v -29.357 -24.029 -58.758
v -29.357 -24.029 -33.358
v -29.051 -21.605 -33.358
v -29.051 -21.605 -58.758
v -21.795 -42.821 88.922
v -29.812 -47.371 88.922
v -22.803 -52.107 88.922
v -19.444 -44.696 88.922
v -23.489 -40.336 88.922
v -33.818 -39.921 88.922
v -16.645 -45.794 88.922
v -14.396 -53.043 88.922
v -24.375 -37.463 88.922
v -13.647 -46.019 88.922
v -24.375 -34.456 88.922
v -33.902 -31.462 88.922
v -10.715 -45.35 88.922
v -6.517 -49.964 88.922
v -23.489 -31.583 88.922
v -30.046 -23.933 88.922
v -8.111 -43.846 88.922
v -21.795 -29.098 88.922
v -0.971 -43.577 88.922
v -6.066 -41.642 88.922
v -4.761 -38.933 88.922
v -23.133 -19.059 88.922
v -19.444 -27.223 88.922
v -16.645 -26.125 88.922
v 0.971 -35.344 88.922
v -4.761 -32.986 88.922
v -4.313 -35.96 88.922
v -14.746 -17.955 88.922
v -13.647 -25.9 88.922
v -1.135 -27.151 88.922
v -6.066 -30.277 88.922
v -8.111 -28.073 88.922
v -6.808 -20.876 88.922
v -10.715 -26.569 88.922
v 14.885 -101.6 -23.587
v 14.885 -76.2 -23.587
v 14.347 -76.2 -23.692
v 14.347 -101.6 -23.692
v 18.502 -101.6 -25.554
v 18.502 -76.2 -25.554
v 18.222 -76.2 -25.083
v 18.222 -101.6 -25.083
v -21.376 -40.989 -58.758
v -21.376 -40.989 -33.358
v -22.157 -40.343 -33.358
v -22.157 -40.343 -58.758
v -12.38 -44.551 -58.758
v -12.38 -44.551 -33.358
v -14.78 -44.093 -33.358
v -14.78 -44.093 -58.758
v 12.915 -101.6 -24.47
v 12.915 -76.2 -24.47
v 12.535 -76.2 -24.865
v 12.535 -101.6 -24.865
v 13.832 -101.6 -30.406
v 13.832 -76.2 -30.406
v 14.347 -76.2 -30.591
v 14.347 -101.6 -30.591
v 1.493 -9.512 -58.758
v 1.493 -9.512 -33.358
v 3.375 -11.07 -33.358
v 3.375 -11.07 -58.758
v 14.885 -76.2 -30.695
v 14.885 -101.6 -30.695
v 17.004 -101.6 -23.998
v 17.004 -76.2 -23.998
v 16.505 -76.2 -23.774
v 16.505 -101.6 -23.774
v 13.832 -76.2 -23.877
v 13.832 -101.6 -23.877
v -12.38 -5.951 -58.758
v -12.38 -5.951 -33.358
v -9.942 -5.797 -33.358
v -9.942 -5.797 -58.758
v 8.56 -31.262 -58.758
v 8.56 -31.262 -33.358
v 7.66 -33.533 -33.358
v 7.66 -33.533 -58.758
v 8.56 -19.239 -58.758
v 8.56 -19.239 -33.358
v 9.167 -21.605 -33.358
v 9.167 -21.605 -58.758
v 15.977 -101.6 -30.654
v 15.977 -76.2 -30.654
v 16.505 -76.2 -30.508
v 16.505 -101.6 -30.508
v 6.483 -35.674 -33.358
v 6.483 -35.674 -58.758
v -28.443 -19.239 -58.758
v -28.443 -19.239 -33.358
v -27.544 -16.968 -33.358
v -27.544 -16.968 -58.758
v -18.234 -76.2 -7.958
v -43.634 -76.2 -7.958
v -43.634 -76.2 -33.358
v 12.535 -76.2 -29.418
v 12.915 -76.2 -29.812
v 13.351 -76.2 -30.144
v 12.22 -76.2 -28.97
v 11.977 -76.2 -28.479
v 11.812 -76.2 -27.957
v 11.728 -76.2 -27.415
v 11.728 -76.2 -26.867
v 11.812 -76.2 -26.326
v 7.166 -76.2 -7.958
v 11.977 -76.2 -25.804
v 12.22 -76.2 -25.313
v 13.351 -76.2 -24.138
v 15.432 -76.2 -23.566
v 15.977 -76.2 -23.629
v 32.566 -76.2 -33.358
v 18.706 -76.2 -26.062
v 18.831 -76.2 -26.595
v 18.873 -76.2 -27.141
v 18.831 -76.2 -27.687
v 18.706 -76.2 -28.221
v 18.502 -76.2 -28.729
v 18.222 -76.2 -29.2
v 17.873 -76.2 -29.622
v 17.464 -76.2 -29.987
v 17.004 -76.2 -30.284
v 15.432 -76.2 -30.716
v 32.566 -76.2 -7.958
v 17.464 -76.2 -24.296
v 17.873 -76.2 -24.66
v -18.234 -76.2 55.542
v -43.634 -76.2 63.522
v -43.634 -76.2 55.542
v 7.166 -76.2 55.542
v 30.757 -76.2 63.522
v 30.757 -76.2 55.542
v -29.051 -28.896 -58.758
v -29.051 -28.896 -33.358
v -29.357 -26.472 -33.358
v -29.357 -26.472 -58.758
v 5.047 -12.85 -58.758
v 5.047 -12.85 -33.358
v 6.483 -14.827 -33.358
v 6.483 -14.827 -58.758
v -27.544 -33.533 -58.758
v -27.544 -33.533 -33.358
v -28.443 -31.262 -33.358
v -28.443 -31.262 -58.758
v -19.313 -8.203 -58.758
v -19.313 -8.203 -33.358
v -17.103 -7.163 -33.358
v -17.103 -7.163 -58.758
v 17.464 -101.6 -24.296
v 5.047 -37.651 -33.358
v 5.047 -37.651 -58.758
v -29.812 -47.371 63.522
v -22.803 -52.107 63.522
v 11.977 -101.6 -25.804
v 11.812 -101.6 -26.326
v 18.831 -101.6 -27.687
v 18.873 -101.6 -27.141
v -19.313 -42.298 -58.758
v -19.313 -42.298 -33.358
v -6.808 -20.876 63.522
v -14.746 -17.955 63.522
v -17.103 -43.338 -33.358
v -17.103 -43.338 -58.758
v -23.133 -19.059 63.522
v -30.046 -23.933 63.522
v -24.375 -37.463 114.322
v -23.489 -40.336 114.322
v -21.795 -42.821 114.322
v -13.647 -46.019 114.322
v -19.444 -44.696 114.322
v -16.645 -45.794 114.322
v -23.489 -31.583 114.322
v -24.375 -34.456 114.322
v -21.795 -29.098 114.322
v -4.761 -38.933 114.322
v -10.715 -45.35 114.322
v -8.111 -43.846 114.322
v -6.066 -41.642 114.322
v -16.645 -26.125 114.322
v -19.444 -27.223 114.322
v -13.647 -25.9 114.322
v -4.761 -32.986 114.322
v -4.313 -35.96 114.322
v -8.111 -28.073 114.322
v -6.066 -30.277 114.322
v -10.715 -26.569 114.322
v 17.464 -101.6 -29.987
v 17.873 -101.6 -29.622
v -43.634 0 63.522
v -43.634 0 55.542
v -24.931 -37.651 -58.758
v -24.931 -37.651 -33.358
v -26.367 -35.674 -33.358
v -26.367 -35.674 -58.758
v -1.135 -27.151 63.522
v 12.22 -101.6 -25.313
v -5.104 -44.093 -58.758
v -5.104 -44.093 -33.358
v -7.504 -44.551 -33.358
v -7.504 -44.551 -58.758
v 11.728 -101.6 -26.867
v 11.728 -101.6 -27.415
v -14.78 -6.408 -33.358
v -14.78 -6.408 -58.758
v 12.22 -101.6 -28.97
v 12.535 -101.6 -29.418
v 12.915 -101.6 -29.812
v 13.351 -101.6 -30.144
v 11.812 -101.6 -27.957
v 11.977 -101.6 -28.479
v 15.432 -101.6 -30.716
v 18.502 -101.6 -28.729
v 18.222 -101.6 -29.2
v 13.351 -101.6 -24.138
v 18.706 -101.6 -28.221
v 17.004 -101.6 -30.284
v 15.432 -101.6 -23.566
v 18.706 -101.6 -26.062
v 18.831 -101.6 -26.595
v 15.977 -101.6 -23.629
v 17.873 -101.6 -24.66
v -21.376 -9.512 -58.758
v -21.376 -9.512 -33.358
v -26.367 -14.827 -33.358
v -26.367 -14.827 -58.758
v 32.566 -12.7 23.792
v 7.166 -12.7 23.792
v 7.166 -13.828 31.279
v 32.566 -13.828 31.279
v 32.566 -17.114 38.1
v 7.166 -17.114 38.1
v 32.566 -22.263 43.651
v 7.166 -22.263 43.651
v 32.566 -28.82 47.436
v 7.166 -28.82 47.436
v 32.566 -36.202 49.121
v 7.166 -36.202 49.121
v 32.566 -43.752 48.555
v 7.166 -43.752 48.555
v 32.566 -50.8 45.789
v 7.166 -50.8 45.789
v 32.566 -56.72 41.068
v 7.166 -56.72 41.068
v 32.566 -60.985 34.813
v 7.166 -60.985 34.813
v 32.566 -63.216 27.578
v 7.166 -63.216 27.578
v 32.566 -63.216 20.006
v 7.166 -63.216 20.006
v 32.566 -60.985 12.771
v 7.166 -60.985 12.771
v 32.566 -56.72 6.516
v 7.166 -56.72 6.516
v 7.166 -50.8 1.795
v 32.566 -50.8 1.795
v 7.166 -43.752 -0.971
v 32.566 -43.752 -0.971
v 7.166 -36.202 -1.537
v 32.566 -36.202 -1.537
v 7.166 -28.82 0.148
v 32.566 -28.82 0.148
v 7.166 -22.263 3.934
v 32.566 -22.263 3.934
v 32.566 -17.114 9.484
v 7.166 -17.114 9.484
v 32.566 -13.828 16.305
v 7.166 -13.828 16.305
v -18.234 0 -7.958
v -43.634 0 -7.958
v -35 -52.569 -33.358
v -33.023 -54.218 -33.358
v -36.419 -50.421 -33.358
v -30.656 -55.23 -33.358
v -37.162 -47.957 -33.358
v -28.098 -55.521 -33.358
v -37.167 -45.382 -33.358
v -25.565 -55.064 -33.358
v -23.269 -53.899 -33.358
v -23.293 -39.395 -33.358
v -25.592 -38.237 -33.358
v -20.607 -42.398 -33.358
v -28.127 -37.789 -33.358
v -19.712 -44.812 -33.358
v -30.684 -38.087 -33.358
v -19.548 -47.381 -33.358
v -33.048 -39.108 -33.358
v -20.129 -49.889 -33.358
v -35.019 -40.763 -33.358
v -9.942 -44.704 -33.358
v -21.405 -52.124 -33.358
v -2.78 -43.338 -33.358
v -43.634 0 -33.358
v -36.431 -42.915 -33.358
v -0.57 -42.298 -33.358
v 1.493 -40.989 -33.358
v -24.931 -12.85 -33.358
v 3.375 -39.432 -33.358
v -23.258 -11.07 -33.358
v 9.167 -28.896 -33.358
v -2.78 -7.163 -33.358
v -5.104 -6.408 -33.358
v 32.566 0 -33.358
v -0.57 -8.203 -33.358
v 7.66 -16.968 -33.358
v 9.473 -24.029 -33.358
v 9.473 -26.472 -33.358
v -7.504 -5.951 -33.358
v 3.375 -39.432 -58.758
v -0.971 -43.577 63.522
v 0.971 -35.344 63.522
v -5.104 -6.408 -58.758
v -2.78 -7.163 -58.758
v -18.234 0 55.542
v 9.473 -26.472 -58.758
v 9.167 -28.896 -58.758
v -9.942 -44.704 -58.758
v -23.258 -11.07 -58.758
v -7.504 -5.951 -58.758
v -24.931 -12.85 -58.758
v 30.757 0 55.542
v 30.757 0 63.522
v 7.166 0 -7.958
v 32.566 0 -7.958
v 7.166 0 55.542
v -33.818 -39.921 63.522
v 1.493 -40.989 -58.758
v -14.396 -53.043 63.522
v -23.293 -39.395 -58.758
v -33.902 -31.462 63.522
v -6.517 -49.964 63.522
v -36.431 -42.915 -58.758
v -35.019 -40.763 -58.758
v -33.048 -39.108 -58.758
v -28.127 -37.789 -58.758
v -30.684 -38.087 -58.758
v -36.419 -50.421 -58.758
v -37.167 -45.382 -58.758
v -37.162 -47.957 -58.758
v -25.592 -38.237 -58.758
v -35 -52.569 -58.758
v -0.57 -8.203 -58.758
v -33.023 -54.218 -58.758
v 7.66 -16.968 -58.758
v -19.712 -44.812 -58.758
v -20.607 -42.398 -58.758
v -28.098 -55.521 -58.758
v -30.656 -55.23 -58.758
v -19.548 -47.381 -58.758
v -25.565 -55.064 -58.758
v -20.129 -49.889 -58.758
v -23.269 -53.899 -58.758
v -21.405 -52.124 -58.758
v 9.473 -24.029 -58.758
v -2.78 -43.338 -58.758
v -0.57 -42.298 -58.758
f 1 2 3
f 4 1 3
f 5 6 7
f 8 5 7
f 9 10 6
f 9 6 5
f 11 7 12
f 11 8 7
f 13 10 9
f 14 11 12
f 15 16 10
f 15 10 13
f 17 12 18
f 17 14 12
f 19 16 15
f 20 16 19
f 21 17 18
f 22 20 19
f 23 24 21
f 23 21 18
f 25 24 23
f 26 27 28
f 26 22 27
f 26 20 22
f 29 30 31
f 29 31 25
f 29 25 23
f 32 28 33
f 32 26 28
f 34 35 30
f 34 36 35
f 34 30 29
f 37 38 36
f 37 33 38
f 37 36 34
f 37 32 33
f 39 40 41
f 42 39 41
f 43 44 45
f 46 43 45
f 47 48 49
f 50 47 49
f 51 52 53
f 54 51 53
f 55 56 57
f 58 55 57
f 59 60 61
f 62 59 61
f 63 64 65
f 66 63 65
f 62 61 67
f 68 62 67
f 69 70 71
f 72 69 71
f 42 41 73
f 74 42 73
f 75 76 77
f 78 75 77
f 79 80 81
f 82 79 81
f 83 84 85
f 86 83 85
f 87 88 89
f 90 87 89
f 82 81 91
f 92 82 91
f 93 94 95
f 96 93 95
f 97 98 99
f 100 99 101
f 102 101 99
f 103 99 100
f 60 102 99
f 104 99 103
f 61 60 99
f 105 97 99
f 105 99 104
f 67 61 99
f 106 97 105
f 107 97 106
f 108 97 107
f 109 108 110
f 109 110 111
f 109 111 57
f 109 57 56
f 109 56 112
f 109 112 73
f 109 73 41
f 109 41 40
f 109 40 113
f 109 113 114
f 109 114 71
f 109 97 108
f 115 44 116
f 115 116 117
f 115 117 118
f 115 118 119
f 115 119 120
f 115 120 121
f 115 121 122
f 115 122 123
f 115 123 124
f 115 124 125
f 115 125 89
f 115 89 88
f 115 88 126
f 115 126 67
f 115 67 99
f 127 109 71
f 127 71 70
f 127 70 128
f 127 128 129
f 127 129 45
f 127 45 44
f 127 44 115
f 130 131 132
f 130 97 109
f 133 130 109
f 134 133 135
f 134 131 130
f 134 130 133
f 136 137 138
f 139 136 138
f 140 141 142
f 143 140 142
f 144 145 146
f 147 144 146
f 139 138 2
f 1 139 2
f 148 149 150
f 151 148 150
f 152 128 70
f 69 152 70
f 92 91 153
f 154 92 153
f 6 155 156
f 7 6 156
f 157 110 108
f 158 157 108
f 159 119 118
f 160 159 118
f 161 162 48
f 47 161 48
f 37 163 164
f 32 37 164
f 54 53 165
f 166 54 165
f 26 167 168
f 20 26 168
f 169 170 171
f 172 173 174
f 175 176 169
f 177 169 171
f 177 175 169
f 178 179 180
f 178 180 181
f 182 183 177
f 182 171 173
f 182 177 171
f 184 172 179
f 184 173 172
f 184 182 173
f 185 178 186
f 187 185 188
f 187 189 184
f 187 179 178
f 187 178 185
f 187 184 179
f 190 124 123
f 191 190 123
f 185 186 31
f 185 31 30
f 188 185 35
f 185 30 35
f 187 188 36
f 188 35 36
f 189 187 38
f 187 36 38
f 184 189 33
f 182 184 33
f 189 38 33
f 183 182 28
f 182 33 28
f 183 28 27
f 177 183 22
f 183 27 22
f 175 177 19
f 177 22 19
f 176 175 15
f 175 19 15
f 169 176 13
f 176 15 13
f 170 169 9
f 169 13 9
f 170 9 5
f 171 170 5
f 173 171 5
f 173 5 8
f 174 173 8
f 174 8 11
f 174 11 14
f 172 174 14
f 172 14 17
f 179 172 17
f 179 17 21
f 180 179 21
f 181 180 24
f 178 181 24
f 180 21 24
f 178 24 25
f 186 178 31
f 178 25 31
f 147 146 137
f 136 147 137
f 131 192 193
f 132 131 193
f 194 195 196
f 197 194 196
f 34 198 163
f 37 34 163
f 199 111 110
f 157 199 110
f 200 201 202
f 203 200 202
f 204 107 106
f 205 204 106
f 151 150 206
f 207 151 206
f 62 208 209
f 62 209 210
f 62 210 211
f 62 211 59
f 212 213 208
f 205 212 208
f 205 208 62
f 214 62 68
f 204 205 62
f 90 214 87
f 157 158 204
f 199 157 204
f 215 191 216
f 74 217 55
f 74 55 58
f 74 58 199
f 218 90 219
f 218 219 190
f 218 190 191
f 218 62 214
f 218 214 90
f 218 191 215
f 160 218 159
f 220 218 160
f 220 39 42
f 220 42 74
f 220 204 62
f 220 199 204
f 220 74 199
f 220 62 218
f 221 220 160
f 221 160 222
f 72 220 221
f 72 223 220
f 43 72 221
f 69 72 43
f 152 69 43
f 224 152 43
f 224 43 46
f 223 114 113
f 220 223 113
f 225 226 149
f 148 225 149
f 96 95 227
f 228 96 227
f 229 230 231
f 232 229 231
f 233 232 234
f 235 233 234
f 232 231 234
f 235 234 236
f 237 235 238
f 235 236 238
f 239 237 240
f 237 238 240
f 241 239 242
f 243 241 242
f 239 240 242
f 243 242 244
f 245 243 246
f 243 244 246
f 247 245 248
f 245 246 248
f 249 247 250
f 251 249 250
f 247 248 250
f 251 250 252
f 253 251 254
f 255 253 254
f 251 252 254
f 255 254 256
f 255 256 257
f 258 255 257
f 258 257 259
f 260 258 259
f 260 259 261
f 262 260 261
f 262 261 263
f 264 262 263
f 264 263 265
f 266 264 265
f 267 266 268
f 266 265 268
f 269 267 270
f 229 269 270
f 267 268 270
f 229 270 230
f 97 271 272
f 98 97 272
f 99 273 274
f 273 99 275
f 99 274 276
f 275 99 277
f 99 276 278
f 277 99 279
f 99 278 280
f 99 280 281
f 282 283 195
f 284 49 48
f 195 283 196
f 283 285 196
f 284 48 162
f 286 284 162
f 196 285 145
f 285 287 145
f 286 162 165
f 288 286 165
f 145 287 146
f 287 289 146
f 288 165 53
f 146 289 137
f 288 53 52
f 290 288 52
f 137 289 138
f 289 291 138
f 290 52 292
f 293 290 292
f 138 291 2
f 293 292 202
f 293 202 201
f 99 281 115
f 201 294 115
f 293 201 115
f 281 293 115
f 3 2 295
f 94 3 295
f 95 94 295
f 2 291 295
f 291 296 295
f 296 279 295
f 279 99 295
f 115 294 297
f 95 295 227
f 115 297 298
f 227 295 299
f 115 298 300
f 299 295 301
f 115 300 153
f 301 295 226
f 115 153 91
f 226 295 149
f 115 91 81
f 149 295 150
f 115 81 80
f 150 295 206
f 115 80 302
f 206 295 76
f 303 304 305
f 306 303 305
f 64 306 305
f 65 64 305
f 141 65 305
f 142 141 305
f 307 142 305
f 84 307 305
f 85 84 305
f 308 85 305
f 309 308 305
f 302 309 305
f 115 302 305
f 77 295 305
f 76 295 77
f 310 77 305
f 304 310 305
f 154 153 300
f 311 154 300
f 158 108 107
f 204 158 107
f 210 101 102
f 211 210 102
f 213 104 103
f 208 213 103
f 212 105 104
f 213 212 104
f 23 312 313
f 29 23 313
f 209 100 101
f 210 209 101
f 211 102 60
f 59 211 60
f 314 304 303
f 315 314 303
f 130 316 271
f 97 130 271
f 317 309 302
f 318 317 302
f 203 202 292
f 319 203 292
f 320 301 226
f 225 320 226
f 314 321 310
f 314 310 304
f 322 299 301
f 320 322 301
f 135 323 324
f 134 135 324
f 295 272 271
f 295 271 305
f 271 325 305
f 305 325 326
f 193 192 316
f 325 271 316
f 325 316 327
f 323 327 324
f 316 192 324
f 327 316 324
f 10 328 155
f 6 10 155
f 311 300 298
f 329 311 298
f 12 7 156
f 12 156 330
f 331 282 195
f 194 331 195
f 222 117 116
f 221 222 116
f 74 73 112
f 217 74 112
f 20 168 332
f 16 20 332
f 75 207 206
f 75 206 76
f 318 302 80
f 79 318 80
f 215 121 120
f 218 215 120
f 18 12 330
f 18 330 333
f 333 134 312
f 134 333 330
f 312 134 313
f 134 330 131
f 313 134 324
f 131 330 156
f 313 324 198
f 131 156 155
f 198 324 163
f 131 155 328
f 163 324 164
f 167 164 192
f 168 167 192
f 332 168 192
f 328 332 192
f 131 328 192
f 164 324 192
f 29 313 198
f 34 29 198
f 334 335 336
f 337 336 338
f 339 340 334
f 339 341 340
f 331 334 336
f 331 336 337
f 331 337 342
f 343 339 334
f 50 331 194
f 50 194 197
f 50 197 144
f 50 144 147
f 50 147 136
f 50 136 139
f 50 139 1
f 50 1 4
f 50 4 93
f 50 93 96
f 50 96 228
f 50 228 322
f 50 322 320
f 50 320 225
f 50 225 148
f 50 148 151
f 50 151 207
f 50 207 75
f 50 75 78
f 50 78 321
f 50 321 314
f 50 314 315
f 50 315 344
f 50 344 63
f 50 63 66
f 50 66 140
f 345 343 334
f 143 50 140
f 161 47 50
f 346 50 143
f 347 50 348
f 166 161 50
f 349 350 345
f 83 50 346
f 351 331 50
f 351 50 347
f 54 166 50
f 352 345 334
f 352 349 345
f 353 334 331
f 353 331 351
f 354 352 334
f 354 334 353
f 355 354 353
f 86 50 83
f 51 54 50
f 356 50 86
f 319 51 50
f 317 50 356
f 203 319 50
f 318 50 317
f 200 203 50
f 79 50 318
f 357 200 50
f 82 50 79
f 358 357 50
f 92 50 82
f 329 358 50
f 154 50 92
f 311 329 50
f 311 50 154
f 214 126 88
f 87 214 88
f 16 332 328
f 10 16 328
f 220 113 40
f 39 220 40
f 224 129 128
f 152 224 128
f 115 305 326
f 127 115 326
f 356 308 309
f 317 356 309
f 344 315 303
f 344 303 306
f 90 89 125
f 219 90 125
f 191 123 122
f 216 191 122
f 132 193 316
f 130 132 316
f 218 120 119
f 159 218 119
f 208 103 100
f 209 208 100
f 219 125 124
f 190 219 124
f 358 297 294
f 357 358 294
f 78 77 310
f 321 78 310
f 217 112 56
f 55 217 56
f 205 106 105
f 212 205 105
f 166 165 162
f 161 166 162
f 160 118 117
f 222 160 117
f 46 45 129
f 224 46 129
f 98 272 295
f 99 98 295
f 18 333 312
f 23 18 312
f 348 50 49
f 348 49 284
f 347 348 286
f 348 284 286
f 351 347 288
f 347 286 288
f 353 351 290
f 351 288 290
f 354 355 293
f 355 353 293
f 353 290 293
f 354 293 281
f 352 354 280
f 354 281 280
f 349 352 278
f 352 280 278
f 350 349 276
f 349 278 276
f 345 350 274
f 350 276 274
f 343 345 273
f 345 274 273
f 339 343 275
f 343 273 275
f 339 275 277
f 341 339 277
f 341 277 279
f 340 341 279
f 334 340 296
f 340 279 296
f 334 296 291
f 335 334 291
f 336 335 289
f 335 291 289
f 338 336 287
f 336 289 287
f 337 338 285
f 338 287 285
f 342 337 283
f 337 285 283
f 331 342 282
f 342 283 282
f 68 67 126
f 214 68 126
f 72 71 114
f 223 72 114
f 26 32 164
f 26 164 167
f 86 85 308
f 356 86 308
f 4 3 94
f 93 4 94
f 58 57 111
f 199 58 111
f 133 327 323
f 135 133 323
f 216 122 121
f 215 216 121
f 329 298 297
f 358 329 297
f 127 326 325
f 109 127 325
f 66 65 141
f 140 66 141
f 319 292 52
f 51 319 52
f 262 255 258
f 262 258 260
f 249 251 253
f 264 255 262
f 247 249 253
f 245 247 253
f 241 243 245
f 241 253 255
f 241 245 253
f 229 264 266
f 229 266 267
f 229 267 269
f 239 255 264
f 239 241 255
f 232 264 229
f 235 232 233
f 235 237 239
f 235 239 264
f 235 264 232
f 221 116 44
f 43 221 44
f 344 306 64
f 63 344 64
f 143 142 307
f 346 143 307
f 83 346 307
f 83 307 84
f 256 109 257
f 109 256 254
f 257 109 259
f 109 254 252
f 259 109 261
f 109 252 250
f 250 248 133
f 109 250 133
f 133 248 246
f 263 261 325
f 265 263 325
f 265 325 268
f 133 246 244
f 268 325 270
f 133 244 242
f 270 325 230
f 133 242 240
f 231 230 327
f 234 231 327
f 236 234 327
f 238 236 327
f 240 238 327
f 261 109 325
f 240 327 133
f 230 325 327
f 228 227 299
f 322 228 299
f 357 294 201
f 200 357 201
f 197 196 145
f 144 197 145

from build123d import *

# Parameters (mm, degrees)
F1_DEPTH  = 76.2
F2_R      = 25.4
F3_DEPTH  = 25.4
F5_DEPTH  = 25.4
F6_R      = 10.087603
F7_DEPTH  = 25.4
F9_DEPTH  = 25.4
F10_R     = 8.870052
F11_DEPTH = 25.4
F13_DEPTH = 25.4


with BuildPart() as f1:
    # F0 (on Front) → F1 (new body)
    with BuildSketch(Plane.XZ):
        Polygon((-43.63443, -7.957917), (-43.63443, -33.357917), (32.56557, -33.357917), (32.56557, -7.957917), (7.16557, -7.957917), (7.16557, 55.542083), (30.757195, 55.542083), (30.757195, 63.522073), (-43.63443, 63.522073), (-43.63443, 55.542083), (-18.23443, 55.542083), (-18.23443, -7.957917), align=None)
    extrude(amount=F1_DEPTH)

    # F2 (on face) → F3 (join)
    with BuildSketch(Plane.YZ.offset(7.16557)):
        with Locations((-38.1, 23.792083)):
            Circle(F2_R)
    extrude(amount=F3_DEPTH)

    # F4 (on face) → F5 (join)
    with BuildSketch(Plane.XY.offset(63.522073)):
        Polygon((-0.971111, -43.576736), (0.971111, -35.34374), (-1.135201, -27.151187), (-6.807516, -20.875895), (-14.746376, -17.955455), (-23.133083, -19.058907), (-30.046344, -23.933462), (-33.902414, -31.462418), (-33.817914, -39.920983), (-29.812201, -47.371402), (-22.802937, -52.106872), (-14.395859, -53.042555), (-6.516928, -49.964097), align=None)
    extrude(amount=F5_DEPTH)

    # F6 (on face) → F7 (join)
    with BuildSketch(Plane.XY.offset(88.922073)):
        with Locations((-14.400505, -35.959587)):
            Circle(F6_R)
    extrude(amount=F7_DEPTH)

    # F8 (on face) → F9 (join)
    with BuildSketch(Plane.XZ.offset(76.2)):
        Polygon((11.728236, -26.867476), (11.728236, -27.415208), (11.811846, -27.95652), (11.977108, -28.478726), (12.220148, -28.969584), (12.535268, -29.41759), (12.915083, -29.812243), (13.35069, -30.144292), (13.831879, -30.405954), (14.347372, -30.591096), (14.885084, -30.69538), (15.432414, -30.716359), (15.976532, -30.653544), (16.504684, -30.508405), (17.004492, -30.284345), (17.464239, -29.986616), (17.87315, -29.622196), (18.22164, -29.199627), (18.501541, -28.728813), (18.706292, -28.22079), (18.831095, -27.687467), (18.873023, -27.141342), (18.831095, -26.595217), (18.706292, -26.061893), (18.501541, -25.553871), (18.22164, -25.083057), (17.87315, -24.660488), (17.464239, -24.296068), (17.004492, -23.998339), (16.504684, -23.774279), (15.976532, -23.62914), (15.432414, -23.566325), (14.885084, -23.587304), (14.347372, -23.691587), (13.831879, -23.87673), (13.35069, -24.138392), (12.915083, -24.470441), (12.535268, -24.865094), (12.220148, -25.3131), (11.977108, -25.803958), (11.811846, -26.326163), align=None)
    extrude(amount=F9_DEPTH)

    # F10 (on face) → F11 (join)
    with BuildSketch(Plane(origin=(0, 0, -33.357917), x_dir=(1, 0, 0), z_dir=(0, 0, -1))):
        with Locations((-28.388368, 46.655256)):
            Circle(F10_R)
    extrude(amount=F11_DEPTH)

    # F12 (on face) → F13 (join)
    with BuildSketch(Plane(origin=(0, 0, -33.357917), x_dir=(1, 0, 0), z_dir=(0, 0, -1))):
        with BuildLine():
            Line((9.473382, 24.02906), (9.473382, 26.472044))
            Line((9.473382, 26.472044), (9.167195, 28.895765))
            Line((9.167195, 28.895765), (8.55965, 31.261998))
            Line((8.55965, 31.261998), (7.660328, 33.533427))
            Line((7.660328, 33.533427), (6.483411, 35.67423))
            Line((6.483411, 35.67423), (5.047461, 37.650645))
            Line((5.047461, 37.650645), (3.375124, 39.431504))
            Line((3.375124, 39.431504), (1.492772, 40.988721))
            Line((1.492772, 40.988721), (-0.569908, 42.297737))
            Line((-0.569908, 42.297737), (-2.780386, 43.337909))
            Line((-2.780386, 43.337909), (-5.103801, 44.092833))
            Line((-5.103801, 44.092833), (-7.503513, 44.550602))
            Line((-7.503513, 44.550602), (-9.941677, 44.703998))
            Line((-9.941677, 44.703998), (-12.37984, 44.550602))
            Line((-12.37984, 44.550602), (-14.779552, 44.092833))
            Line((-14.779552, 44.092833), (-17.102968, 43.337909))
            Line((-17.102968, 43.337909), (-19.313446, 42.297737))
            Line((-19.313446, 42.297737), (-21.376125, 40.988721))
            Line((-21.376125, 40.988721), (-22.157084, 40.342656))
            ThreePointArc((-22.157084, 40.342656), (-22.705241, 39.844977), (-23.292994, 39.394747))
            Line((-23.292994, 39.394747), (-24.930814, 37.650645))
            Line((-24.930814, 37.650645), (-26.366764, 35.67423))
            Line((-26.366764, 35.67423), (-27.543681, 33.533427))
            Line((-27.543681, 33.533427), (-28.443003, 31.261998))
            Line((-28.443003, 31.261998), (-29.050549, 28.895765))
            Line((-29.050549, 28.895765), (-29.356736, 26.472044))
            Line((-29.356736, 26.472044), (-29.356736, 24.02906))
            Line((-29.356736, 24.02906), (-29.050549, 21.60534))
            Line((-29.050549, 21.60534), (-28.443003, 19.239107))
            Line((-28.443003, 19.239107), (-27.543681, 16.967678))
            Line((-27.543681, 16.967678), (-26.366764, 14.826875))
            Line((-26.366764, 14.826875), (-24.930814, 12.850459))
            Line((-24.930814, 12.850459), (-23.258477, 11.0696))
            Line((-23.258477, 11.0696), (-21.376125, 9.512384))
            Line((-21.376125, 9.512384), (-19.313446, 8.203367))
            Line((-19.313446, 8.203367), (-17.102968, 7.163196))
            Line((-17.102968, 7.163196), (-14.779552, 6.408272))
            Line((-14.779552, 6.408272), (-12.37984, 5.950502))
            Line((-12.37984, 5.950502), (-9.941677, 5.797106))
            Line((-9.941677, 5.797106), (-7.503513, 5.950502))
            Line((-7.503513, 5.950502), (-5.103801, 6.408272))
            Line((-5.103801, 6.408272), (-2.780386, 7.163196))
            Line((-2.780386, 7.163196), (-0.569908, 8.203367))
            Line((-0.569908, 8.203367), (1.492772, 9.512384))
            Line((1.492772, 9.512384), (3.375124, 11.0696))
            Line((3.375124, 11.0696), (5.047461, 12.850459))
            Line((5.047461, 12.850459), (6.483411, 14.826875))
            Line((6.483411, 14.826875), (7.660328, 16.967678))
            Line((7.660328, 16.967678), (8.55965, 19.239107))
            Line((8.55965, 19.239107), (9.167195, 21.60534))
            Line((9.167195, 21.60534), (9.473382, 24.02906))
        make_face()
    extrude(amount=F13_DEPTH)


solid = f1.part
